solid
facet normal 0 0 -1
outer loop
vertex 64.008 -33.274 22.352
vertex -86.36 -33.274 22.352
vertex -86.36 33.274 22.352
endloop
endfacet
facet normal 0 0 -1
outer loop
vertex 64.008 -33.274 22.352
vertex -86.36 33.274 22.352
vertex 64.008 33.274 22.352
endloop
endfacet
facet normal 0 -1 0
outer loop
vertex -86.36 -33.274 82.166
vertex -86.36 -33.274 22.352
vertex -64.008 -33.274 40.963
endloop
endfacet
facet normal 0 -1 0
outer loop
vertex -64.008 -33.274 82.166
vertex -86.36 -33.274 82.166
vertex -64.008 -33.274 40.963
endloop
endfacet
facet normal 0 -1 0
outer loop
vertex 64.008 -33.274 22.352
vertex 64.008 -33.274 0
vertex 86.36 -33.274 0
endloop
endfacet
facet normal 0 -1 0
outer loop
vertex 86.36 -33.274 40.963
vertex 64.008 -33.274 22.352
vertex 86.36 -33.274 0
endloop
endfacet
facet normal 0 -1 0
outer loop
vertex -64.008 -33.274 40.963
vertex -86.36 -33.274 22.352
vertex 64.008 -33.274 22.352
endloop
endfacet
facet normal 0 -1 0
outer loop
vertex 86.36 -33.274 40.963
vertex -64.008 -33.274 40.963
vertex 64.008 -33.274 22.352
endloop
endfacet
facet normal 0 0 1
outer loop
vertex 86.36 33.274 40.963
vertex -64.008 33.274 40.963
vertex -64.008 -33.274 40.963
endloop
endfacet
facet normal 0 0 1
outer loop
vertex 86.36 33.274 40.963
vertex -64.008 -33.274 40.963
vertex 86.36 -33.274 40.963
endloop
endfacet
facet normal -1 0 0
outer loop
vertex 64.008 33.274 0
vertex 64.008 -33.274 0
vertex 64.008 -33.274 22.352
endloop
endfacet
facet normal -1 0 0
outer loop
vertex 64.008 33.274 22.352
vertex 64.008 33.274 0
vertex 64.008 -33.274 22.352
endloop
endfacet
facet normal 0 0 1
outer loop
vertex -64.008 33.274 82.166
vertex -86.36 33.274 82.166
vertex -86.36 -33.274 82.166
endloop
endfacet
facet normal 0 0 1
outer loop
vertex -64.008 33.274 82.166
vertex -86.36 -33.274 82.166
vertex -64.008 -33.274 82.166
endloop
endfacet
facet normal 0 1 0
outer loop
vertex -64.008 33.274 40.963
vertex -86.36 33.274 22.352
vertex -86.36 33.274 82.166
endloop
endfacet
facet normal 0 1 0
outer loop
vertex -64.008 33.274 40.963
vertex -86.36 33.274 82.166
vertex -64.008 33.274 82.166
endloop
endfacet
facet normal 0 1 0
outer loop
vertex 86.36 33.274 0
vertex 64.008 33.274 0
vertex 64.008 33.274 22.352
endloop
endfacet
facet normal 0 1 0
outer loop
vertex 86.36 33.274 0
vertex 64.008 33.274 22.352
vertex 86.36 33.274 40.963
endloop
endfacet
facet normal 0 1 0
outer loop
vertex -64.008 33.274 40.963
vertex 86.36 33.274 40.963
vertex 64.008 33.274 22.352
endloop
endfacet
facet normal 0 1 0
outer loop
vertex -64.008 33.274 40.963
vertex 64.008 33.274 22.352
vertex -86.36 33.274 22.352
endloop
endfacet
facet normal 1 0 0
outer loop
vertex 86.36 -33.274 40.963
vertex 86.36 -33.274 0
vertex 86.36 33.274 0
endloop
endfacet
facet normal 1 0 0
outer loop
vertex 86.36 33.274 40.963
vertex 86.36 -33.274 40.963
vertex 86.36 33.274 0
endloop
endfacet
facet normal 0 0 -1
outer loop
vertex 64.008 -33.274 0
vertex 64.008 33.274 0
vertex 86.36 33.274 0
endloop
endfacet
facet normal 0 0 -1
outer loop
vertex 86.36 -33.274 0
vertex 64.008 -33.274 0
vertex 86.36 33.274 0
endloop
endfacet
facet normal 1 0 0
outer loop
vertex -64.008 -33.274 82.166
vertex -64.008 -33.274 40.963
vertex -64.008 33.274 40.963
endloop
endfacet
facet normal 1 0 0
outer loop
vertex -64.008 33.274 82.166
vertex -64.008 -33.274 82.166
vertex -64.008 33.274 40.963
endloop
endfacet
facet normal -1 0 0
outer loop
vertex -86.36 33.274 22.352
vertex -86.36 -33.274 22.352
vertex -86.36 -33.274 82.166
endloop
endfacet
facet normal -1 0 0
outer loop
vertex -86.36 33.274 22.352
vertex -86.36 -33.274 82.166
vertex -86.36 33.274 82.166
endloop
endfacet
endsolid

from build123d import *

# Parameters (mm, degrees)
F0_W     = 172.72
F0_H     = 66.548
F1_DEPTH = 63.5
F2_W     = 150.368
F2_H     = 22.352
F3_DEPTH = 189.62974
F4_W     = 150.368
F4_H     = 66.548
F5_DEPTH = 22.53701
F6_DEPTH = 63.5
F7_DEPTH = 41.45952
F8_DEPTH = 3.37497


with BuildPart() as f1:
    # F0 (on Top) → F1 (new body)
    with BuildSketch(Plane.XY):
        Rectangle(F0_W, F0_H)
    extrude(amount=F1_DEPTH)

    # F2 (on face) → F3 (cut)
    with BuildSketch(Plane.XZ.offset(33.274)):
        with Locations((-11.176, 11.176)):
            Rectangle(F2_W, F2_H)
    extrude(amount=-F3_DEPTH, mode=Mode.SUBTRACT)

    # F4 (on face) → F5 (cut)
    with BuildSketch(Plane.XY.offset(63.5)):
        with Locations((11.176, 0)):
            Rectangle(F4_W, F4_H)
    extrude(amount=-F5_DEPTH, mode=Mode.SUBTRACT)

    # F6 (add): a face of the model
    f6_faces = [f1.faces().sort_by_distance(p)[0] for p in [
        (-75.184, 0, 63.5),
    ]]
    extrude(f6_faces, amount=F6_DEPTH)

    # F7 (cut): a face of the model
    f7_faces = [f1.faces().sort_by_distance(p)[0] for p in [
        (-75.184, 0, 127),
    ]]
    extrude(f7_faces, amount=-F7_DEPTH, mode=Mode.SUBTRACT)

    # F8 (cut): a face of the model
    f8_faces = [f1.faces().sort_by_distance(p)[0] for p in [
        (-75.184, 0, 85.54048),
    ]]
    extrude(f8_faces, amount=-F8_DEPTH, mode=Mode.SUBTRACT)


solid = f1.part
